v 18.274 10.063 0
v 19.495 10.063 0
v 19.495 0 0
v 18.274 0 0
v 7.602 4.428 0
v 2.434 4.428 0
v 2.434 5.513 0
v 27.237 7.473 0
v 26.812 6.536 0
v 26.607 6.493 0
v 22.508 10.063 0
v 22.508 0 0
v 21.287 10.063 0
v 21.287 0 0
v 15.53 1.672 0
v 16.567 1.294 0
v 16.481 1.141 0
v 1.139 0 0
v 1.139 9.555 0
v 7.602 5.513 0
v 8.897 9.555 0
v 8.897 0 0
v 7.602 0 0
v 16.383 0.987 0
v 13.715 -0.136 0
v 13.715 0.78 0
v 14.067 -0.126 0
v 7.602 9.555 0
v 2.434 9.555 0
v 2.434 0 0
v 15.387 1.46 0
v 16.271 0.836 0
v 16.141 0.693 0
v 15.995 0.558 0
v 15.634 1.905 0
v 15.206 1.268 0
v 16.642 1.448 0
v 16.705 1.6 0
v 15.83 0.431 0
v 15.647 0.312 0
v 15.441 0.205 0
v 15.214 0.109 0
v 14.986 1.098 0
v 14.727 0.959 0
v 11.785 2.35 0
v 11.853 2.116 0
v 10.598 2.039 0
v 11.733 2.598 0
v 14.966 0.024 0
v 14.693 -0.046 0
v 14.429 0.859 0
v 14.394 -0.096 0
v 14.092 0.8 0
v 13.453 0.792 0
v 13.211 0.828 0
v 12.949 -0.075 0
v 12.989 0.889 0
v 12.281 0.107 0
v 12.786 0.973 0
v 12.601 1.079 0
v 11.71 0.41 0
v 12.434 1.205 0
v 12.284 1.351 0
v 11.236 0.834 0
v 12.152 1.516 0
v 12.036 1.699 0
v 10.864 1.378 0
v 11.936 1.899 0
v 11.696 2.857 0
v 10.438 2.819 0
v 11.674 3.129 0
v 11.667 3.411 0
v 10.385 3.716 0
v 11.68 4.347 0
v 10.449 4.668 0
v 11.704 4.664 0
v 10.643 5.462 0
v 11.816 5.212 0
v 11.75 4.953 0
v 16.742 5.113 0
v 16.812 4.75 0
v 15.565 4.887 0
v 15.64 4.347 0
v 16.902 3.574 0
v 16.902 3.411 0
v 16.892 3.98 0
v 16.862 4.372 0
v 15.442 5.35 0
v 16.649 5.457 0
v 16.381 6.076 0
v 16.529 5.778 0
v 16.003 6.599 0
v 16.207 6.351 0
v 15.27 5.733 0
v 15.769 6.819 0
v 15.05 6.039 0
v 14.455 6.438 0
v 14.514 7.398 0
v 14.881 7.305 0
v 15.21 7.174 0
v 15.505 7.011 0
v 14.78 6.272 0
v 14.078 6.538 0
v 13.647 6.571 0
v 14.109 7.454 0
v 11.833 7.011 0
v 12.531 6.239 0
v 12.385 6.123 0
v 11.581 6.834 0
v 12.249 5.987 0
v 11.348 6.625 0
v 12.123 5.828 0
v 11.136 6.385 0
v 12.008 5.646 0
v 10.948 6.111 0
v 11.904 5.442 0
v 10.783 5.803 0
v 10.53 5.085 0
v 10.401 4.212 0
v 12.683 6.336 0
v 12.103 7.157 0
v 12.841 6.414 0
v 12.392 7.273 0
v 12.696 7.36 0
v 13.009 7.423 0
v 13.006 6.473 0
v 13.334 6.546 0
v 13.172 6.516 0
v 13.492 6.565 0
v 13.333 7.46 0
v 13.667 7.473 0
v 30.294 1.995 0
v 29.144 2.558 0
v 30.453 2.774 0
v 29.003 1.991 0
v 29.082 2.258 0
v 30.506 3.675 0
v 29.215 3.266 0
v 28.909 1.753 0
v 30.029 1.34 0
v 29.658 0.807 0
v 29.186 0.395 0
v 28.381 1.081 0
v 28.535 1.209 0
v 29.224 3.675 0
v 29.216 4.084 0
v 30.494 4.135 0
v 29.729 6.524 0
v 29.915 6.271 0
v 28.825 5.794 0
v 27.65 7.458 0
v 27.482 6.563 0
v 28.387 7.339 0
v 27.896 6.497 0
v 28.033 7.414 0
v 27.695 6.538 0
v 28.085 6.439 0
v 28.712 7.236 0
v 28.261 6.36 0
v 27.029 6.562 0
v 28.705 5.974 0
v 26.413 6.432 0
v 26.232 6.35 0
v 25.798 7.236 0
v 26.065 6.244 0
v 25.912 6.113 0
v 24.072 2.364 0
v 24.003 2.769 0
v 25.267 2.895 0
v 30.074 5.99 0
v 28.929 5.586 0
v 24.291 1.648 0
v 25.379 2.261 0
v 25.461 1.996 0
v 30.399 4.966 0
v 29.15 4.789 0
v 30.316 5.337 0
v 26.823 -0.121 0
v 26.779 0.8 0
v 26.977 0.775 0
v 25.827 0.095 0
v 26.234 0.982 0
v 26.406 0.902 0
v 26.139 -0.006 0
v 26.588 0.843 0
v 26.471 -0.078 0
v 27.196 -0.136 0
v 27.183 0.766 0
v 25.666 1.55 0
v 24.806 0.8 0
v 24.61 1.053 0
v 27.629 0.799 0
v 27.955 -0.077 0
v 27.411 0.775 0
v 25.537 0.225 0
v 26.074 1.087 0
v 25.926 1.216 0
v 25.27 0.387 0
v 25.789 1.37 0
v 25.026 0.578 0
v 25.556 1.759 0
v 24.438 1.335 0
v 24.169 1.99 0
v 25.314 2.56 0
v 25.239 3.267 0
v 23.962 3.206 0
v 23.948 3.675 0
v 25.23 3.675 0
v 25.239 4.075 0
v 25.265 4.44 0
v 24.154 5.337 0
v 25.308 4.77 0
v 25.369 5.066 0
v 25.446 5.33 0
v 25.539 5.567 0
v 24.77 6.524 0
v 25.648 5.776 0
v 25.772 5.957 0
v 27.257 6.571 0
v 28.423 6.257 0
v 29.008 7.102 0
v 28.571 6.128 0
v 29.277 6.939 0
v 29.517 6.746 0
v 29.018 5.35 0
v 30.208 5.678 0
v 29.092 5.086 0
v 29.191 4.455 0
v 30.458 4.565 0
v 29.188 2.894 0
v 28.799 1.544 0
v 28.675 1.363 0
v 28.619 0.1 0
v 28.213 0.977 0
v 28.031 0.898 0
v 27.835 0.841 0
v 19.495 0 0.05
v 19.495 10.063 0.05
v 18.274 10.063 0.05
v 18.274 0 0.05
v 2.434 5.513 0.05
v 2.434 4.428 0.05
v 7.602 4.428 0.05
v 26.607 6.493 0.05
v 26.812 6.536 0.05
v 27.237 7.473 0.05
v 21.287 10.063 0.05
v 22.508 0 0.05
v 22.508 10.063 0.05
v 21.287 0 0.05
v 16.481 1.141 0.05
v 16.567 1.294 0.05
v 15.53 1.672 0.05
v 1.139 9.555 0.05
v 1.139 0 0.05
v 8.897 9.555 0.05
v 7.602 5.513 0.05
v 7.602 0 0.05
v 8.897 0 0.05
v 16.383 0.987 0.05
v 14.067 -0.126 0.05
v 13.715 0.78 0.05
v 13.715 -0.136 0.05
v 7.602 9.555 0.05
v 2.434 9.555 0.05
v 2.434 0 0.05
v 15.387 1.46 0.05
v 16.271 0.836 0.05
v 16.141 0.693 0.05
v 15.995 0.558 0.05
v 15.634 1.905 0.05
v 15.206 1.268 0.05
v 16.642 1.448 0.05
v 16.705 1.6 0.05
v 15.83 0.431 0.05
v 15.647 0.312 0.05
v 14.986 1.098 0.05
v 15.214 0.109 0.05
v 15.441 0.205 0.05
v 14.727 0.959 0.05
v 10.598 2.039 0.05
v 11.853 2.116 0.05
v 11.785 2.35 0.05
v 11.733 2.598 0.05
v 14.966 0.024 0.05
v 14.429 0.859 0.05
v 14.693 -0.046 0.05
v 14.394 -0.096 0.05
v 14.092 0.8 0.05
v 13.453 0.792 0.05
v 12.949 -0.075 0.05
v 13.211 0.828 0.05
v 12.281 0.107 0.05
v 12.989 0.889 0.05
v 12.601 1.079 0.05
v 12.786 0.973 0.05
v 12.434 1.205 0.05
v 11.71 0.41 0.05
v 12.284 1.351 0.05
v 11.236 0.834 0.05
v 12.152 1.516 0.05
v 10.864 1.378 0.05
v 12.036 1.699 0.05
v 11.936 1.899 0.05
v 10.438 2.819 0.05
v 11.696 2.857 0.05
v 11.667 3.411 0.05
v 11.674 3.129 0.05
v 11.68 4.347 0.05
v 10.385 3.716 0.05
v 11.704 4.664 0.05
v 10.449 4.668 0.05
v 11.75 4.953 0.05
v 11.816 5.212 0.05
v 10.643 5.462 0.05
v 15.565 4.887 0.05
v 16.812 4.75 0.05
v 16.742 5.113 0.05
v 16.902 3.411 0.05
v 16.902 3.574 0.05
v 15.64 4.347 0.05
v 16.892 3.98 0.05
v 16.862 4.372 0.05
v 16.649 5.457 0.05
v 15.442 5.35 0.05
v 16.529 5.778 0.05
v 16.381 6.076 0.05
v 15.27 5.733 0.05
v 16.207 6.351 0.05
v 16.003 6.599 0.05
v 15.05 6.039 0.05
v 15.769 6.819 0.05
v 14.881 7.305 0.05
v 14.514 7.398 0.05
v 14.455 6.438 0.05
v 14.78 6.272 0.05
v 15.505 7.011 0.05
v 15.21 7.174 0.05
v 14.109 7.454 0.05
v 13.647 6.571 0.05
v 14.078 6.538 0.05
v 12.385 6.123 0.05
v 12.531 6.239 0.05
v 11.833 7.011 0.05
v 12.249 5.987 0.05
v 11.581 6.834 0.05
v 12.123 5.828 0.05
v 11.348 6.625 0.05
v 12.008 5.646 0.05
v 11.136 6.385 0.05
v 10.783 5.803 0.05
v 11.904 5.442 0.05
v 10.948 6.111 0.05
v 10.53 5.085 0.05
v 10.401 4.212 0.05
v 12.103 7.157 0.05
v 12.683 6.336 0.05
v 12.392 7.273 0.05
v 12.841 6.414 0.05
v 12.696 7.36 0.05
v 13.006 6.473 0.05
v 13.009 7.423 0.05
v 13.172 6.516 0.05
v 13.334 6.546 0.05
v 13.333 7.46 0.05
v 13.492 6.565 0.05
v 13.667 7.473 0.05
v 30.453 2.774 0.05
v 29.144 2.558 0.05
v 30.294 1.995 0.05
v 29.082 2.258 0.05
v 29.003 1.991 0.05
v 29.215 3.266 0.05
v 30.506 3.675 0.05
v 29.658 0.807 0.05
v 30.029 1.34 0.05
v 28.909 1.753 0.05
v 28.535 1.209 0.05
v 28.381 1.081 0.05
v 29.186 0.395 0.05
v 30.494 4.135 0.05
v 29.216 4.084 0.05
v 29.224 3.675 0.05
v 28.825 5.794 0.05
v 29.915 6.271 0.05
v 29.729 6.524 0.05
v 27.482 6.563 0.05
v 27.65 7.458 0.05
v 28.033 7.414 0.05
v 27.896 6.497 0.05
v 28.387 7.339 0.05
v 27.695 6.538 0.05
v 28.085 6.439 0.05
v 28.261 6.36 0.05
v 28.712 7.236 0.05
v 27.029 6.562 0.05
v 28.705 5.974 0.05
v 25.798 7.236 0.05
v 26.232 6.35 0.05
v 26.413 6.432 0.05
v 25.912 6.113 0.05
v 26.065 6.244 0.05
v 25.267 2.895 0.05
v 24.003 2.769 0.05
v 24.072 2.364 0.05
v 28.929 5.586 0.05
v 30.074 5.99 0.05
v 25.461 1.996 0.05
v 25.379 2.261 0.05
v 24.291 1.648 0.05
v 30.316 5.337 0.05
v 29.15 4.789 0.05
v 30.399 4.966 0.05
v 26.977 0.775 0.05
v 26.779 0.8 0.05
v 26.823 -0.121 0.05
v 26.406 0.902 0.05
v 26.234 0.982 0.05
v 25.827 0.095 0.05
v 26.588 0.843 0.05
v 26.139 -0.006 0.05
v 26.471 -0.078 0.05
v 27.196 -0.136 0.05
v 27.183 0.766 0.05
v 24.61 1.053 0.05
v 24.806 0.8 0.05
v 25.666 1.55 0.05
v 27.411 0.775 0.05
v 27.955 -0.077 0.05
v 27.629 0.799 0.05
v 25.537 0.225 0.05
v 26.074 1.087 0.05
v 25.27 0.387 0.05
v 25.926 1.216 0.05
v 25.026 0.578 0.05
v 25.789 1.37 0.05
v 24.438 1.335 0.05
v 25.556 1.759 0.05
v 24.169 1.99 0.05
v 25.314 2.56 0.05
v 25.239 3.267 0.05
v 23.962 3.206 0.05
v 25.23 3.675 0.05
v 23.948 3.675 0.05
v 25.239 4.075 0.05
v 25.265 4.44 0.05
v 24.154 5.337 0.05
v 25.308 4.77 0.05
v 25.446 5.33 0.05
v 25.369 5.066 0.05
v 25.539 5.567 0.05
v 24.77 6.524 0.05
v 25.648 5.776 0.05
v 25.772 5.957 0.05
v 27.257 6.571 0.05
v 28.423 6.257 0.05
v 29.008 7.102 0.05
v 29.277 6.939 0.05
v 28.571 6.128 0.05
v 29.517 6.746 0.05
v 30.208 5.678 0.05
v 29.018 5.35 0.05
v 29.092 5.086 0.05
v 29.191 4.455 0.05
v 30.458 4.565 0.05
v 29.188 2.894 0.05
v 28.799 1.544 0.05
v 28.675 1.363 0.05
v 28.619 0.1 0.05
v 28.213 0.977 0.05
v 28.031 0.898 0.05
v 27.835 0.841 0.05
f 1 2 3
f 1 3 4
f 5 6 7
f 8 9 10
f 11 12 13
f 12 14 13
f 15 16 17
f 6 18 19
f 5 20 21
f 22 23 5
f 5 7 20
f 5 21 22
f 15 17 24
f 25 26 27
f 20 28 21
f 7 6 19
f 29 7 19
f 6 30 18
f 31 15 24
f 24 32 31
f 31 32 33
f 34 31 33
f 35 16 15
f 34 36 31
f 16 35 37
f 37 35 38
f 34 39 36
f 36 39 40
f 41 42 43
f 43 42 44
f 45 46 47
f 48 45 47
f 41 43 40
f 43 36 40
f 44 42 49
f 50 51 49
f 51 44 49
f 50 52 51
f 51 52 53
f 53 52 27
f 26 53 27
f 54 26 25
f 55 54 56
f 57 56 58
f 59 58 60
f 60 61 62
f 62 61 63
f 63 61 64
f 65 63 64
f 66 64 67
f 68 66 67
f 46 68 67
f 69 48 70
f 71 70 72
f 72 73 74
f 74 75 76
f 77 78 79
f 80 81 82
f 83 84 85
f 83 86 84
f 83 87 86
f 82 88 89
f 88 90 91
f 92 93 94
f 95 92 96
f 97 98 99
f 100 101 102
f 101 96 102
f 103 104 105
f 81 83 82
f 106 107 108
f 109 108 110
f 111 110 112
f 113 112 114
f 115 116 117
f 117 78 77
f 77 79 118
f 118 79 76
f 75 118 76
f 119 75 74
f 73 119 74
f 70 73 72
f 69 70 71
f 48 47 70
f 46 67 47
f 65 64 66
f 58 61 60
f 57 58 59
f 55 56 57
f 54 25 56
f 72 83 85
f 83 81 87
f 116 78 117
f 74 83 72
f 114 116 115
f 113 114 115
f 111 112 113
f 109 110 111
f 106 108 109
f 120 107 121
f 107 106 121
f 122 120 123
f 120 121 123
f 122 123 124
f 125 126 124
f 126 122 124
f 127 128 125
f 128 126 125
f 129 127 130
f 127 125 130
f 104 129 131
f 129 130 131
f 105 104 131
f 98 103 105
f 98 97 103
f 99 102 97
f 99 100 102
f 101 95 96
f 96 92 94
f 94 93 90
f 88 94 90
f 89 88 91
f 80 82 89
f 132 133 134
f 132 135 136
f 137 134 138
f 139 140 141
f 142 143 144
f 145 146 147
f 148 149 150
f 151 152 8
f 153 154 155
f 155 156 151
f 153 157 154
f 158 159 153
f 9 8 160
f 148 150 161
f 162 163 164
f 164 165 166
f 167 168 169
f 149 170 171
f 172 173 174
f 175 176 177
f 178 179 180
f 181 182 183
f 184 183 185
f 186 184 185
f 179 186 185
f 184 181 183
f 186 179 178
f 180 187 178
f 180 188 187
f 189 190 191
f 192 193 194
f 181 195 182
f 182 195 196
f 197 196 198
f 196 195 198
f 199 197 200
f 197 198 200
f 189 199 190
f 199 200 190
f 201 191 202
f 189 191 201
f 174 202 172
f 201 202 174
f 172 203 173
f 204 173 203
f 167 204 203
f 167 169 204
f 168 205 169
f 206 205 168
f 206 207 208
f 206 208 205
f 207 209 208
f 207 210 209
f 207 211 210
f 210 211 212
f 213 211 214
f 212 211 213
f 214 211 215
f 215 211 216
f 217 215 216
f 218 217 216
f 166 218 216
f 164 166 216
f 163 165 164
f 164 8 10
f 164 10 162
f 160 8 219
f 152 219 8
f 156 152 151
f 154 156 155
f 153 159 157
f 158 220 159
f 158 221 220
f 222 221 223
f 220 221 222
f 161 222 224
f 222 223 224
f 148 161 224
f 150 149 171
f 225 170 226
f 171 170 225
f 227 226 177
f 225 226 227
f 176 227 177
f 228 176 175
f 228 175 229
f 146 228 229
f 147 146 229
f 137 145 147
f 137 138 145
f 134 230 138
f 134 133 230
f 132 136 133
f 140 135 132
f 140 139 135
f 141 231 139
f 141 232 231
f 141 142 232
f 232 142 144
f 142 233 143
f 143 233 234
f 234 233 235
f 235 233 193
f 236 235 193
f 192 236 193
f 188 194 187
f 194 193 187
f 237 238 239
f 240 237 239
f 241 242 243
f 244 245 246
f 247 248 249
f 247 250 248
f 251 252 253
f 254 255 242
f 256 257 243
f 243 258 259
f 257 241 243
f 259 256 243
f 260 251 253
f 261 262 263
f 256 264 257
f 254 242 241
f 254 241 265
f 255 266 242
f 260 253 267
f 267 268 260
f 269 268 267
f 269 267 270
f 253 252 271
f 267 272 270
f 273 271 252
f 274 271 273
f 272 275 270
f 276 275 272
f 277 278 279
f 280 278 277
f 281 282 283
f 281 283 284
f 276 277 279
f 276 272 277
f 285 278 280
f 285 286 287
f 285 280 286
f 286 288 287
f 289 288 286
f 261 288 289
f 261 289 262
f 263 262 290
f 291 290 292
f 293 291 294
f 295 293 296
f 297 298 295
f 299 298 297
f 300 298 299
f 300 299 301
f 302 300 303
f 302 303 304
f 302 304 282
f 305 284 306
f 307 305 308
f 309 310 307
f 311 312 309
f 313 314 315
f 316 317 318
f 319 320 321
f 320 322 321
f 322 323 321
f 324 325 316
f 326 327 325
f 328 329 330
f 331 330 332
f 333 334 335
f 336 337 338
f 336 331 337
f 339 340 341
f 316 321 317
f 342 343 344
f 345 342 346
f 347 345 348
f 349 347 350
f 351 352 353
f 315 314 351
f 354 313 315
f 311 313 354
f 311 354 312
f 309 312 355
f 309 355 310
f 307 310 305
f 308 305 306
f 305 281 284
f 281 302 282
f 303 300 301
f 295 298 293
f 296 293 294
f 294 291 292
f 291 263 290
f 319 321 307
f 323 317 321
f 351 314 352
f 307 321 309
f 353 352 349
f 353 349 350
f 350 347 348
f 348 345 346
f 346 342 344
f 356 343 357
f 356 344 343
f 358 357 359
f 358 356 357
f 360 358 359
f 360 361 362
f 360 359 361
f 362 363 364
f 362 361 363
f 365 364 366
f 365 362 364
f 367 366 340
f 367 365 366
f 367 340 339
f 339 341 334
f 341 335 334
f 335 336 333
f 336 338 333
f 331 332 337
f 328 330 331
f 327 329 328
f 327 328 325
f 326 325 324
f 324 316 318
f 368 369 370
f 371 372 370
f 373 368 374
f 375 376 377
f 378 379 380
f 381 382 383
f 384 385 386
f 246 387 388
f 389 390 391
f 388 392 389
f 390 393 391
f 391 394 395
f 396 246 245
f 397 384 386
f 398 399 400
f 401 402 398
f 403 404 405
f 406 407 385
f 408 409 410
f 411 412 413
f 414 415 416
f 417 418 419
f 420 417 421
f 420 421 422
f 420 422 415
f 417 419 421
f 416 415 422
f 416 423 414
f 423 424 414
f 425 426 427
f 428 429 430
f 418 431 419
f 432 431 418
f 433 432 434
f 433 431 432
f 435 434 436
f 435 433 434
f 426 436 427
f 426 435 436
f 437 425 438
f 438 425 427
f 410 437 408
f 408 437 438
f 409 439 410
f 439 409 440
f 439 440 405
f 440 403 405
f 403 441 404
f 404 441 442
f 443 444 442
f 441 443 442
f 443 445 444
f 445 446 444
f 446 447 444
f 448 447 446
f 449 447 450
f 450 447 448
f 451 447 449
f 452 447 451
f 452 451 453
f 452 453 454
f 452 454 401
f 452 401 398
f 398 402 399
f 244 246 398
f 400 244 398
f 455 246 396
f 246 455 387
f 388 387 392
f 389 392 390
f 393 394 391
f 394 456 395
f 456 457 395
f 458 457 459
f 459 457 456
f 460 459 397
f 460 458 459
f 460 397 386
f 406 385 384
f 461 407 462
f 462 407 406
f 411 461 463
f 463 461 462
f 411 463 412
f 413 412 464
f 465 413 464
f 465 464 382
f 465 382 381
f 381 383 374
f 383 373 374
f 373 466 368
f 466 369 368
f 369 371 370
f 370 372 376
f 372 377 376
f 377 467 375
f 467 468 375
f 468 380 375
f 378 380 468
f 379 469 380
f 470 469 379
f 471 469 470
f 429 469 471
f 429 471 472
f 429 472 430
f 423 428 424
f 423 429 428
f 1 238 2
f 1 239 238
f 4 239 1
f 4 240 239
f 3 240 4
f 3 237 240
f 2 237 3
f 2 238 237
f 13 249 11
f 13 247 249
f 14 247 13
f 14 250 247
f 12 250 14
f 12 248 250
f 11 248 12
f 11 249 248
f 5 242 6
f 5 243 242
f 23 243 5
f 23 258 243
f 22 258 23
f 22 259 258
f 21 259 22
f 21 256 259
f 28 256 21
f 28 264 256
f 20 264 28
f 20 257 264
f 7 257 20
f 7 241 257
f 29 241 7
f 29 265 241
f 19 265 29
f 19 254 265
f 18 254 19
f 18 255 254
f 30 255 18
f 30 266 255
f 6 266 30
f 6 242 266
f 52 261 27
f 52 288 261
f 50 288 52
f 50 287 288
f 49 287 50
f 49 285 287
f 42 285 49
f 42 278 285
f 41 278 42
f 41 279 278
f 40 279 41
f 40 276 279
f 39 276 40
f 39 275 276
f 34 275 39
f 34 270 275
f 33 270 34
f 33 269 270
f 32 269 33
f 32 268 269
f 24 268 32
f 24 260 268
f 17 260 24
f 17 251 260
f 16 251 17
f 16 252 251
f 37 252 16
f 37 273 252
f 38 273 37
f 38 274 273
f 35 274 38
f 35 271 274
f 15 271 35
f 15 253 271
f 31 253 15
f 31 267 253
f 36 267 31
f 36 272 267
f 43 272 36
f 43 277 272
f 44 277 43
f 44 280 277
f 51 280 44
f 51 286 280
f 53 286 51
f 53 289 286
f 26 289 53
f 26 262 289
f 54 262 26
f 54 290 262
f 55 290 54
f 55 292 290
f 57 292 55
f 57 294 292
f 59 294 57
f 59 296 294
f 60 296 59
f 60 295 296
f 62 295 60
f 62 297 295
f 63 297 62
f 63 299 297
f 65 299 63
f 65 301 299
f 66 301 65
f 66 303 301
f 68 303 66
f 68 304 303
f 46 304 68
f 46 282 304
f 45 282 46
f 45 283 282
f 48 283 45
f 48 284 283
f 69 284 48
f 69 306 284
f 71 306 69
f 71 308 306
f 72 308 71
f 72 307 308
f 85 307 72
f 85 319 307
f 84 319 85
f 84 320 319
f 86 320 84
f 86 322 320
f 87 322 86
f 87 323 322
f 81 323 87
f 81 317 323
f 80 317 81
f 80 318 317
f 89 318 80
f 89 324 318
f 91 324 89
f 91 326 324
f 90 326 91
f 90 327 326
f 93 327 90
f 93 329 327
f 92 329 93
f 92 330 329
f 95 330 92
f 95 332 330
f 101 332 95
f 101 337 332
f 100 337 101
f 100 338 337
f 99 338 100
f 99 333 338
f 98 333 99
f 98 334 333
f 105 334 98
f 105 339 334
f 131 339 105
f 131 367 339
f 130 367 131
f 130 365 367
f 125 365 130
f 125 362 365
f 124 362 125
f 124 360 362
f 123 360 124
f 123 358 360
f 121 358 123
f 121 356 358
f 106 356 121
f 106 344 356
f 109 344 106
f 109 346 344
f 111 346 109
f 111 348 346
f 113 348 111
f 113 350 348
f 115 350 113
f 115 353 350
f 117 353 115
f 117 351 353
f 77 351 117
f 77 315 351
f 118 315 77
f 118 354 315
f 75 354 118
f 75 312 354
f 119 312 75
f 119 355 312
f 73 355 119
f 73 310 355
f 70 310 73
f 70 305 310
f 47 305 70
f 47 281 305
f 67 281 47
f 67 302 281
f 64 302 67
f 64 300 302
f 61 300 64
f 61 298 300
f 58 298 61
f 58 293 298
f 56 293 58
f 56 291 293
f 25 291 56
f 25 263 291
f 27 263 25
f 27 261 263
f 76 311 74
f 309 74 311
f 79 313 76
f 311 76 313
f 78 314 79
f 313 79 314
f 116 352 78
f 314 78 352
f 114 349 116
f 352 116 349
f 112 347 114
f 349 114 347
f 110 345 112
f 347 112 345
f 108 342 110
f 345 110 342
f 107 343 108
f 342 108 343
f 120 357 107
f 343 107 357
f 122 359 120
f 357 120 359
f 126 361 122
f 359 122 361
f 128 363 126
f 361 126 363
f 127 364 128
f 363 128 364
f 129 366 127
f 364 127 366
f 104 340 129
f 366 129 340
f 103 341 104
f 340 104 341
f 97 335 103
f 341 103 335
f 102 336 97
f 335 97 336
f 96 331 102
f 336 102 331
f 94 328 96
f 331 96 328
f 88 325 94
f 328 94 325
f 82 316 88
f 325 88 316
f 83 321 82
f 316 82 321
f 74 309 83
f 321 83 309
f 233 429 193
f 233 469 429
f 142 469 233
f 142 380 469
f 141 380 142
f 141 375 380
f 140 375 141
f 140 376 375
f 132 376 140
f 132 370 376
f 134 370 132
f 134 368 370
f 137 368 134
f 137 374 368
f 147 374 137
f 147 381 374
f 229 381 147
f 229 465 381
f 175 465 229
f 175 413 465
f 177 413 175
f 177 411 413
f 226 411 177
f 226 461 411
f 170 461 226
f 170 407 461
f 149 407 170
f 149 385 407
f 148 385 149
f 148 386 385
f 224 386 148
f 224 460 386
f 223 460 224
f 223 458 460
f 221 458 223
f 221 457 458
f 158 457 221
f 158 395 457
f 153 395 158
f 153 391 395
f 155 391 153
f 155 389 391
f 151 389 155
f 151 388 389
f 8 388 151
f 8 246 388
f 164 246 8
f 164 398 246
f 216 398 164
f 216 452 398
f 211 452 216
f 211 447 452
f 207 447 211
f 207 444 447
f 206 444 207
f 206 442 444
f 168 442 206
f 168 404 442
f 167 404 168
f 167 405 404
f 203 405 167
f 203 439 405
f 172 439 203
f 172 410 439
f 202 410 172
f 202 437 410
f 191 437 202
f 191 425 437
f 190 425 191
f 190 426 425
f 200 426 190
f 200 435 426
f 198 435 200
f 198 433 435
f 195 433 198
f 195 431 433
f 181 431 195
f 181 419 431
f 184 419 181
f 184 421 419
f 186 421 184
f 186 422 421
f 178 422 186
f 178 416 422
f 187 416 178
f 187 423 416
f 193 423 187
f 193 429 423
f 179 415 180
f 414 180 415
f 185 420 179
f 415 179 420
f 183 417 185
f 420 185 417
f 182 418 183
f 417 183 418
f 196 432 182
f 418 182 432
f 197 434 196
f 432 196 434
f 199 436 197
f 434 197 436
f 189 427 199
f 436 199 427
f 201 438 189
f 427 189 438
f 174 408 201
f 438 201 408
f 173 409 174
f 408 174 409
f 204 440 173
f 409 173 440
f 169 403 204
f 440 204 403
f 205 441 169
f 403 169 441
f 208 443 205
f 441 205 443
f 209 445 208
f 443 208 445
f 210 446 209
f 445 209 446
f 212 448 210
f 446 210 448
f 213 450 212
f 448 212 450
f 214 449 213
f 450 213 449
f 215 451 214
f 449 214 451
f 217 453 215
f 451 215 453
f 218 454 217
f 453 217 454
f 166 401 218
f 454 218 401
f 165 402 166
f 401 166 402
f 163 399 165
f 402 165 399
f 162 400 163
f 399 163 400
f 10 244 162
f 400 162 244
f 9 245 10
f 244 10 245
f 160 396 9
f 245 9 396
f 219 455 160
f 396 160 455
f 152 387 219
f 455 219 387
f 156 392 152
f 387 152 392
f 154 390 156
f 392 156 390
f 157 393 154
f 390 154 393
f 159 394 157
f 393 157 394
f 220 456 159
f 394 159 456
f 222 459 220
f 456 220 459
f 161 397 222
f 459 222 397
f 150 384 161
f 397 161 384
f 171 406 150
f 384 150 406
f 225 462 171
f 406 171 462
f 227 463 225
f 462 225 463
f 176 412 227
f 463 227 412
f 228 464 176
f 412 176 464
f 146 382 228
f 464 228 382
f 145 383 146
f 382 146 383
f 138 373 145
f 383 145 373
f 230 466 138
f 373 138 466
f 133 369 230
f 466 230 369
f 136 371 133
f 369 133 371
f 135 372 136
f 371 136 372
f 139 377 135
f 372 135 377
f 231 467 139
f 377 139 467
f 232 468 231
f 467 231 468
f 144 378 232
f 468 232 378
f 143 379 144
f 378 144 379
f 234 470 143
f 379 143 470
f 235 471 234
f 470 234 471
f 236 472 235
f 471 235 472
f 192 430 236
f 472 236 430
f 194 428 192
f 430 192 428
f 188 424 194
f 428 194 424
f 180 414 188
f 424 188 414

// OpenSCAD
//linear_extrude(height=0.05) import("C:\\Users\\caleb\\diy-pcb\\test_pcb\\test_pcb\\SVG\\test_pcb-F_Cu.svg");

//linear_extrude(height=0.05) import("C:\\Users\\caleb\\diy-pcb\\test_pcb\\test_pcb\\gerber\\top.svg");

//difference() {
//linear_extrude(height=0.05) import("C:/Users/caleb/Downloads/md2022-(src,fab,pcba)/FAB-teensy-mic-array-A.2/top-layer.svg");
//translate([0, 0, -0.01]) linear_extrude(height=0.1) import("C:/Users/caleb/Downloads/md2022-(src,fab,pcba)/FAB-teensy-mic-array-A.2/holes.svg");
//}

linear_extrude(height=0.05) text("Hello");
